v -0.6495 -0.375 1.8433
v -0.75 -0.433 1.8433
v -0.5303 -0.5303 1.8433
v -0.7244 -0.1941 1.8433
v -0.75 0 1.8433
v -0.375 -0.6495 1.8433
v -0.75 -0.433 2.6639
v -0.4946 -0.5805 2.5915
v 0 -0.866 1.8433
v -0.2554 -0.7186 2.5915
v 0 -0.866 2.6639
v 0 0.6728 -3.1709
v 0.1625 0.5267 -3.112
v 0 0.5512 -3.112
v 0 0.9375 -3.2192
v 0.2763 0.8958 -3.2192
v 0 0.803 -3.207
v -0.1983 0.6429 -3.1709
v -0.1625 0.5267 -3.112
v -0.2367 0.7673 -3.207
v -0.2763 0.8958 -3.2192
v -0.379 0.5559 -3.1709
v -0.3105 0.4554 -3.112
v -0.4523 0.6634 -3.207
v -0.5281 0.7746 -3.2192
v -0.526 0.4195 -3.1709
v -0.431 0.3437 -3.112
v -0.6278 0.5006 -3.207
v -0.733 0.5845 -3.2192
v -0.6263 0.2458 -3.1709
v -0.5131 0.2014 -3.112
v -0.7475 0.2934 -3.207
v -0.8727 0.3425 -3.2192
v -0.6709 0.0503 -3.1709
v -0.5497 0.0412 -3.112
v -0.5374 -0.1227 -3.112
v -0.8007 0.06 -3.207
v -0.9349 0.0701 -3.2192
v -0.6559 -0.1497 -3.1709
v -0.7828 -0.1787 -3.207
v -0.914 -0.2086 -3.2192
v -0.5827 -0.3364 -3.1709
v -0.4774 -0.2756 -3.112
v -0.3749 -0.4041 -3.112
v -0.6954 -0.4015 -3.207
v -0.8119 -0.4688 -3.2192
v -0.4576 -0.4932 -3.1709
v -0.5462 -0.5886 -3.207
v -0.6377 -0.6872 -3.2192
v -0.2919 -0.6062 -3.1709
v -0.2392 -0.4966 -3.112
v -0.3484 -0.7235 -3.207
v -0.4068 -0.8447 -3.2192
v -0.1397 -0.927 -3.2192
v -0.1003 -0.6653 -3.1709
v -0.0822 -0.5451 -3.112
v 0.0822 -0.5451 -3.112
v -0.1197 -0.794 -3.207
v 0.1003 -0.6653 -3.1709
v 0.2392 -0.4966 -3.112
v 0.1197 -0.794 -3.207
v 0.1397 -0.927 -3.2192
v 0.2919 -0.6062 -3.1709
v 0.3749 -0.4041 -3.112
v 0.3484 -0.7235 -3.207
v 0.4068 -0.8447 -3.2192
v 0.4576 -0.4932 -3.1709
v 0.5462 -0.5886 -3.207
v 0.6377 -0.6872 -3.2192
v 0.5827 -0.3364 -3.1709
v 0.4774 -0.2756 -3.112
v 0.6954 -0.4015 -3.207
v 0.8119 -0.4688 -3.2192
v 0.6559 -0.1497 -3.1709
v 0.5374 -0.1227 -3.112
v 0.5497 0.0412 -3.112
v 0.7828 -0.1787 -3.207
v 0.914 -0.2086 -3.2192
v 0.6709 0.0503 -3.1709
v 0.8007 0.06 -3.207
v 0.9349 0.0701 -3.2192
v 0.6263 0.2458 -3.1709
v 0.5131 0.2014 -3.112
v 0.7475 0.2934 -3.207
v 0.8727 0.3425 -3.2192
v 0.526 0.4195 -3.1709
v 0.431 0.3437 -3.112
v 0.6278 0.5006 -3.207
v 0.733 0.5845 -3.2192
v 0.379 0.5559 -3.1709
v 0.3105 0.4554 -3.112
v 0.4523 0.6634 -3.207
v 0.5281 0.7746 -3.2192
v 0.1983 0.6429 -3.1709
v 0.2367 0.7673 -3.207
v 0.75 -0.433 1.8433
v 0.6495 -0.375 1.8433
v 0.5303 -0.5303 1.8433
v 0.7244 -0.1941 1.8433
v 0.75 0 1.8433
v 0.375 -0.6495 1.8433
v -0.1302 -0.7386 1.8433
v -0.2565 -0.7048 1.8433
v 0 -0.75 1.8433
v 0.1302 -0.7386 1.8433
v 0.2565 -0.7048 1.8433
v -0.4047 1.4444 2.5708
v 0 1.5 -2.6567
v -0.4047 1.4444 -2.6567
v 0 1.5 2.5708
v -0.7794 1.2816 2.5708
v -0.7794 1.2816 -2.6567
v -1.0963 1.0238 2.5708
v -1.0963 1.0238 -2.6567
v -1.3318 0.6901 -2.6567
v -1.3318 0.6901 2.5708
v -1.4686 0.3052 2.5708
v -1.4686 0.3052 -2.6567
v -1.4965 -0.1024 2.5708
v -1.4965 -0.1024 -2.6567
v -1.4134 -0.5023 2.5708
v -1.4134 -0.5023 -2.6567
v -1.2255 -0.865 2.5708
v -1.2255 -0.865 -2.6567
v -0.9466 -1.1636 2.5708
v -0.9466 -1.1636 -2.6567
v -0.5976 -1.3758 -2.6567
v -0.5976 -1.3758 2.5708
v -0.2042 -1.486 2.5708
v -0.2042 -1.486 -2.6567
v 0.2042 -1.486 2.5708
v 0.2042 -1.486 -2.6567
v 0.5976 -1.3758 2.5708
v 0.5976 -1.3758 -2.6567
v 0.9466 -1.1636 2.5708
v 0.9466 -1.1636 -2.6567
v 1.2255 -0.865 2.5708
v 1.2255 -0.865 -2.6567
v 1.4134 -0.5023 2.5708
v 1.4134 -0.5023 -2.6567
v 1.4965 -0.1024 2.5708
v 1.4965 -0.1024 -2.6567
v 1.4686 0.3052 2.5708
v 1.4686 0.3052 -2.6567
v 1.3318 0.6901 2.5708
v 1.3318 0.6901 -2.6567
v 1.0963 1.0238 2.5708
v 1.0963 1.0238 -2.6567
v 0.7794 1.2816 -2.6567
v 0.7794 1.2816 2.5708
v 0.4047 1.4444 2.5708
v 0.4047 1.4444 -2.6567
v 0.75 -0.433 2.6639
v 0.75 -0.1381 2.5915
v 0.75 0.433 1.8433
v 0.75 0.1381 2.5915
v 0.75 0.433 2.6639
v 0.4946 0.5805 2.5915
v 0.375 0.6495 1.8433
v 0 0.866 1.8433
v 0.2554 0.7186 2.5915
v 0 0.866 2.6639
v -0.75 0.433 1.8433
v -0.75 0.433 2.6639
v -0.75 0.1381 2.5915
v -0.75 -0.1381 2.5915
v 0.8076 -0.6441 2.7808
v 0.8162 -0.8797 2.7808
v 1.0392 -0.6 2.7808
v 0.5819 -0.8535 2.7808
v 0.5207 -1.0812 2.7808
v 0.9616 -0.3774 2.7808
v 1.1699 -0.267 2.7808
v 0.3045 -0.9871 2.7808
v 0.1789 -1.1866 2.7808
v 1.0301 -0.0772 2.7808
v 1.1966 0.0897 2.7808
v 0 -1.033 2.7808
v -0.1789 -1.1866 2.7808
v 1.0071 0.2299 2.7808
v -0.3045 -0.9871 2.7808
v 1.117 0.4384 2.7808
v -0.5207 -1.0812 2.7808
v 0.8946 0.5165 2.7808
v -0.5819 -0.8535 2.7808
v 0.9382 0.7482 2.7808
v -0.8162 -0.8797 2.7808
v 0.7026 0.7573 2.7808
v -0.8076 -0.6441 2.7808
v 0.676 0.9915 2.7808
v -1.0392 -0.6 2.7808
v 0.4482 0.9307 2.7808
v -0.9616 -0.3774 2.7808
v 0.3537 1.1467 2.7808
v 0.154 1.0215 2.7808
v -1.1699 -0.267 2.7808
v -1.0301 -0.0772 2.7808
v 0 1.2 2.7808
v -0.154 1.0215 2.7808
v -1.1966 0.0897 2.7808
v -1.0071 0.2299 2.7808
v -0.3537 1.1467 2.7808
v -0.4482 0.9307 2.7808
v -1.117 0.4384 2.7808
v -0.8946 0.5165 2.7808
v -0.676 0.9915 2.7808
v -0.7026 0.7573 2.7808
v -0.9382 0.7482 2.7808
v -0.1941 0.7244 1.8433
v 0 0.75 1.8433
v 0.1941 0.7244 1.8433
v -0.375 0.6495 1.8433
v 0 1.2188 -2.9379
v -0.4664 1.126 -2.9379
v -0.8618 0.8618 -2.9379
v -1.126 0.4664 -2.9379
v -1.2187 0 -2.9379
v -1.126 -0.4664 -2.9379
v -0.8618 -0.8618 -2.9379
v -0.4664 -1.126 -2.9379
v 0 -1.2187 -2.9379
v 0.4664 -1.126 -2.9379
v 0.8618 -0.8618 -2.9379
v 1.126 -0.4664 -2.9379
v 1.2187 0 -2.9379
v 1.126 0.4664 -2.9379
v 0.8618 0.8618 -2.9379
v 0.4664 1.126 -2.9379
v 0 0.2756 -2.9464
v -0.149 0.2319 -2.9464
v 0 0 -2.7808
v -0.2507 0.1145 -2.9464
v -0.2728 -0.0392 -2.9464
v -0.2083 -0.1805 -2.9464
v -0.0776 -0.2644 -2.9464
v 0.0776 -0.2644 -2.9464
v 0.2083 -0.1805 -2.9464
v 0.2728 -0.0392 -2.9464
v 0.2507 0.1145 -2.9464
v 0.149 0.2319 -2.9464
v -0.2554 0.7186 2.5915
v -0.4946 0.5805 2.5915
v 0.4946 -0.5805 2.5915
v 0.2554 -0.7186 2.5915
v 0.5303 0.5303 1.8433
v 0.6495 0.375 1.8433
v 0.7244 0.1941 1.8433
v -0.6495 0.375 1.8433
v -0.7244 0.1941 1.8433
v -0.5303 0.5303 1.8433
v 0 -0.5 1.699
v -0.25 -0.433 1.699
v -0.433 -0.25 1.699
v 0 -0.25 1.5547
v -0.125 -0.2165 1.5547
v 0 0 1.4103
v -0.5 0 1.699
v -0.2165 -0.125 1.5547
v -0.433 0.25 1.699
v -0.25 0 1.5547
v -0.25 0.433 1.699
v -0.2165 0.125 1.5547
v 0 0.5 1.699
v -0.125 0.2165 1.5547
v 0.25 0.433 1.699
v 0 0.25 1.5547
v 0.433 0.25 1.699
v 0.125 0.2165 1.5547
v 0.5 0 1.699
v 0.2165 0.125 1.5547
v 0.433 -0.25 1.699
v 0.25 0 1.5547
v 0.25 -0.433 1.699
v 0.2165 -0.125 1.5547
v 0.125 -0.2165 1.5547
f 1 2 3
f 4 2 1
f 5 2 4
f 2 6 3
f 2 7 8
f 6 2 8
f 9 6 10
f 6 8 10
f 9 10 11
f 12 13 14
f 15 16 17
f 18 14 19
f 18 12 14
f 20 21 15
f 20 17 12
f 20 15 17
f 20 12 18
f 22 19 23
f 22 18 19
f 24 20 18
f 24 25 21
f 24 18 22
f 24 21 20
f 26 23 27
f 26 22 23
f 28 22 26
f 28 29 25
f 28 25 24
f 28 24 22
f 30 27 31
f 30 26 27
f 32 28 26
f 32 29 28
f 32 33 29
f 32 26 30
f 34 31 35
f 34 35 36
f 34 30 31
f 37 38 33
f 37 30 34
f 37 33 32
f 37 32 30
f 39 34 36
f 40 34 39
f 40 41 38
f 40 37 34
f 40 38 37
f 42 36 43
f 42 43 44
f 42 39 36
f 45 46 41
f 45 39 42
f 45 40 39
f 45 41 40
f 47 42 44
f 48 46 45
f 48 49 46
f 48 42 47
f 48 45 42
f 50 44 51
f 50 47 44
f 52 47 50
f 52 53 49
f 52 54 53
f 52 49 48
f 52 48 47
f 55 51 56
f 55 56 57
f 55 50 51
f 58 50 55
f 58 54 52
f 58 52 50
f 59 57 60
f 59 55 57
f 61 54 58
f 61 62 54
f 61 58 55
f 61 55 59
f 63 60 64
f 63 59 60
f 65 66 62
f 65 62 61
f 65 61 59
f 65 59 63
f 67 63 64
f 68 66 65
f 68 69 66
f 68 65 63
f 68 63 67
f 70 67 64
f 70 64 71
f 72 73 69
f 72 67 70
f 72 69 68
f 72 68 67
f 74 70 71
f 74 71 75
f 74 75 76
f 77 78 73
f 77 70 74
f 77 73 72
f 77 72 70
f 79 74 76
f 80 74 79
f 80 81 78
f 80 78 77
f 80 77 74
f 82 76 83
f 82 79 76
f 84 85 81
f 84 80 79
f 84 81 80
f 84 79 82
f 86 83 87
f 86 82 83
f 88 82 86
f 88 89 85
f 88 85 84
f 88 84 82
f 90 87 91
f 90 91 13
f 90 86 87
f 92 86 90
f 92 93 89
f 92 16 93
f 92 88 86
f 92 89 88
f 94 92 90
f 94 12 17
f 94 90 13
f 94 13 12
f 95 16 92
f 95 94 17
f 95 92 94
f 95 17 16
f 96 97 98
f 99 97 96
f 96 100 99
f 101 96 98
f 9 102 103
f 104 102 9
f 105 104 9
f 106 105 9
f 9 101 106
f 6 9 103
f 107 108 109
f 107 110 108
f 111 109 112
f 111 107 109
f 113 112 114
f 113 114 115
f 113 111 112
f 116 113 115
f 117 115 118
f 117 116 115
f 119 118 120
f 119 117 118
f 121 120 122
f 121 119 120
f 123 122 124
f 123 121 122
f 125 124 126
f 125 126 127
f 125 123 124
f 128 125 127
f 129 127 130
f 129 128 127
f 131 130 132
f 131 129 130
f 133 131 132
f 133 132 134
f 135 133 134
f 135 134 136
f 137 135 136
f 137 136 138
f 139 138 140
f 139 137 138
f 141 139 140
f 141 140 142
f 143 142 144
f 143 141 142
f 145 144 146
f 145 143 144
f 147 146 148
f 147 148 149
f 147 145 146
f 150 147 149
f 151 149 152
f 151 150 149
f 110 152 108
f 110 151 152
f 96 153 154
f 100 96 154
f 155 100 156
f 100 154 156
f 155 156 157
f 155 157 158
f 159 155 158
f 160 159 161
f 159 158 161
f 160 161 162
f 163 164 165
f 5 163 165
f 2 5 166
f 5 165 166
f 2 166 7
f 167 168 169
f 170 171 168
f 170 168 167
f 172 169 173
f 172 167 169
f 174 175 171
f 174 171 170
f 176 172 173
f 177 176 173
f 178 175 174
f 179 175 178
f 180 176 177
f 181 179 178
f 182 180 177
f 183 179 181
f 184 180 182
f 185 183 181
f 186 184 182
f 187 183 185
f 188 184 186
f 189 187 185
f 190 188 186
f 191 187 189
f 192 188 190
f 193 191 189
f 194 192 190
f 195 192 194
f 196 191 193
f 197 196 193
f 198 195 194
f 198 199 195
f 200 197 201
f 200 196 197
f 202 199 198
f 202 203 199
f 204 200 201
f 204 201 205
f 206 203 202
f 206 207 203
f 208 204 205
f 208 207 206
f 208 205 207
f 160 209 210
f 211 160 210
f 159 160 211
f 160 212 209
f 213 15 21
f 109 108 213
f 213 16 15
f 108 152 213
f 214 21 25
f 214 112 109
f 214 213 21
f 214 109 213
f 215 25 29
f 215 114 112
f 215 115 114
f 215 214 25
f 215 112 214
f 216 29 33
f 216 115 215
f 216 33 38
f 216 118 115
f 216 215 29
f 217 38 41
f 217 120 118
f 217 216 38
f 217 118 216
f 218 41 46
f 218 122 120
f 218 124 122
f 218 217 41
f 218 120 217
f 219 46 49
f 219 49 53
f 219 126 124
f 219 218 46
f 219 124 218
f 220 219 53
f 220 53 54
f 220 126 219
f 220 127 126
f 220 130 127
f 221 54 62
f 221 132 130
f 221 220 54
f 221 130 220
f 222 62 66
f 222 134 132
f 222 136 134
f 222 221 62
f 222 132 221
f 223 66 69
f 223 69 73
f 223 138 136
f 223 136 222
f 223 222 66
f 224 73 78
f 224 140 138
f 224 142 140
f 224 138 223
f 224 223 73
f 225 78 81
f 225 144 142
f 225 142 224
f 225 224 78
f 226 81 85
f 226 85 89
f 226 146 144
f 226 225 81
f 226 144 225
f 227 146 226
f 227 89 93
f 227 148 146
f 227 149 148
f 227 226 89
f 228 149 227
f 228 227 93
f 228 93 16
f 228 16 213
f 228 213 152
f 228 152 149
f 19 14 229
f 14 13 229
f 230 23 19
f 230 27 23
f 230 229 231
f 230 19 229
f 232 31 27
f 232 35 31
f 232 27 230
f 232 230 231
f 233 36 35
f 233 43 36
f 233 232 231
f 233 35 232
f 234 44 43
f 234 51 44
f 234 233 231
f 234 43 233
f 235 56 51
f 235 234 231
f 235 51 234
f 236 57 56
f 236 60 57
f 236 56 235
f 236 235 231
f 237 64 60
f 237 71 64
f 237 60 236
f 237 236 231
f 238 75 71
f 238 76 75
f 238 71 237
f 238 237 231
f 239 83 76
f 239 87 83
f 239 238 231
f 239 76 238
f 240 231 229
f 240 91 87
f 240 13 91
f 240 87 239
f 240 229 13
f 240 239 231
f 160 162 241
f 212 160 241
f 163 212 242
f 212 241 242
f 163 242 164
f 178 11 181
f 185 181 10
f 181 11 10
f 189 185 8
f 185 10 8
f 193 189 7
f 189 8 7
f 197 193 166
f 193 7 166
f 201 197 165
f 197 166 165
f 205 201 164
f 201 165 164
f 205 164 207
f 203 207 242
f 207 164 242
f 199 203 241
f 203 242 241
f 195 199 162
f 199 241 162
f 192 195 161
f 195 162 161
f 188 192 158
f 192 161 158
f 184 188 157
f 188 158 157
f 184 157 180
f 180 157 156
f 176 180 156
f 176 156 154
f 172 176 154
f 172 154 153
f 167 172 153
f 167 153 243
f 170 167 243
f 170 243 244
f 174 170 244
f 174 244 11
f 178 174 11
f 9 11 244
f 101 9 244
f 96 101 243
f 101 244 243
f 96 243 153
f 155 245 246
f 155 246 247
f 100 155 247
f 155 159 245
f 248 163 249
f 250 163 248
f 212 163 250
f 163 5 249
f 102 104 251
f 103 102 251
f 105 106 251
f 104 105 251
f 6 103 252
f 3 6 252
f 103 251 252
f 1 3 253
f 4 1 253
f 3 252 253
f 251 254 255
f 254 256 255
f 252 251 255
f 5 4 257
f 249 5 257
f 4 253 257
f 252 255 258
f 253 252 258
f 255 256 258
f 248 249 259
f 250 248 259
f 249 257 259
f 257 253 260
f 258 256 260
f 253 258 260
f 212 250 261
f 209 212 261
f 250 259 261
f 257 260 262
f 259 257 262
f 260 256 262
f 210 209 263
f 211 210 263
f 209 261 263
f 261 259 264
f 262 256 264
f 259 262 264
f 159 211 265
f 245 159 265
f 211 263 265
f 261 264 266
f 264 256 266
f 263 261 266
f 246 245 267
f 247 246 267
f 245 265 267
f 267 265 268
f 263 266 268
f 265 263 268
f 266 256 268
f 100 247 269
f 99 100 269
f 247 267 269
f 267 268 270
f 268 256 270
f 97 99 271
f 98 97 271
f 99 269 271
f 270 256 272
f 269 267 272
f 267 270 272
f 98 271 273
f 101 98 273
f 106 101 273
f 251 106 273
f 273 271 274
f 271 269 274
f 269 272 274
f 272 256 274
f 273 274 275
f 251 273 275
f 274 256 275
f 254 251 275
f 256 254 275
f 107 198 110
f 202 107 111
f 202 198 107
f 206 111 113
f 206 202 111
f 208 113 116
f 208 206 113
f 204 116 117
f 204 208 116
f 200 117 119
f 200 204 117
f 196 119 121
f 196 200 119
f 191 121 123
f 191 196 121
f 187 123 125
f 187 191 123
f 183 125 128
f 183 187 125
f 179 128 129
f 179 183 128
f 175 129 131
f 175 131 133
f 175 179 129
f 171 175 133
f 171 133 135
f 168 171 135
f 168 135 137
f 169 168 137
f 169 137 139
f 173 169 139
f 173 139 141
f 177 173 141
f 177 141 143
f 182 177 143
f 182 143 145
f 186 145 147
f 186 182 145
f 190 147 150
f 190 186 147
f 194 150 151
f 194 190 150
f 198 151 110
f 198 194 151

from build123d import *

# Parameters (mm, degrees)
CUT_EXTRUDE3_DEPTH = 0.9375


with BuildPart() as part:
    # Sketch4 → Revolve1 (revolve)
    with BuildSketch(Plane(origin=(0, 0, 0), x_dir=(0, 0, -1), z_dir=(1, 0, 0))):
        with BuildLine():
            Line((2.780834109, 0), (3.112041367, 0.551221444))
            ThreePointArc((3.112041367, 0.551221444), (3.191888731, 0.737071218), (3.219165891, 0.9375))
            Line((3.219165891, 0.9375), (2.656665891, 1.5))
            Line((2.656665891, 1.5), (-2.570771847, 1.5))
            Line((-2.570771847, 1.5), (-2.780834109, 1.2))
            Line((-2.780834109, 1.2), (-2.780834109, 0))
            Line((-2.780834109, 0), (2.780834109, 0))
        make_face()
    revolve(axis=Axis((0, 0, -2.780834109), (0, 0, 1)))

    # Sketch6 → Cut-Extrude3 (cut)
    with BuildSketch(Plane.XY.offset(2.780834109)):
        Polygon((0.75, 0.433012702), (0, 0.866025404), (-0.75, 0.433012702), (-0.75, -0.433012702), (0, -0.866025404), (0.75, -0.433012702), align=None)
    extrude(amount=-CUT_EXTRUDE3_DEPTH, mode=Mode.SUBTRACT)

    # Cut-Extrude4 cone 1 section (through the dimple's axis) → Cut-Extrude4 (revolve, cut)
    with BuildSketch(Plane(origin=(0, 0, 2.780834109), x_dir=(0, -1, 0), z_dir=(1, 0, 0))):
        Polygon((0, 0), (1.033012702, 0), (0, 0.723323281), align=None)
    revolve(axis=Axis((0, 0, 2.780834109), (0, 0, -1)), mode=Mode.SUBTRACT)

    # Cut-Extrude5 cone 1 section (through the dimple's axis) → Cut-Extrude5 (revolve, cut)
    with BuildSketch(Plane(origin=(0, 0, 1.843334109), x_dir=(0, -1, 0), z_dir=(1, 0, 0))):
        Polygon((0, 0), (0.75, 0), (0, 0.433012702), align=None)
    revolve(axis=Axis((0, 0, 1.843334109), (0, 0, -1)), mode=Mode.SUBTRACT)


solid = part.part
